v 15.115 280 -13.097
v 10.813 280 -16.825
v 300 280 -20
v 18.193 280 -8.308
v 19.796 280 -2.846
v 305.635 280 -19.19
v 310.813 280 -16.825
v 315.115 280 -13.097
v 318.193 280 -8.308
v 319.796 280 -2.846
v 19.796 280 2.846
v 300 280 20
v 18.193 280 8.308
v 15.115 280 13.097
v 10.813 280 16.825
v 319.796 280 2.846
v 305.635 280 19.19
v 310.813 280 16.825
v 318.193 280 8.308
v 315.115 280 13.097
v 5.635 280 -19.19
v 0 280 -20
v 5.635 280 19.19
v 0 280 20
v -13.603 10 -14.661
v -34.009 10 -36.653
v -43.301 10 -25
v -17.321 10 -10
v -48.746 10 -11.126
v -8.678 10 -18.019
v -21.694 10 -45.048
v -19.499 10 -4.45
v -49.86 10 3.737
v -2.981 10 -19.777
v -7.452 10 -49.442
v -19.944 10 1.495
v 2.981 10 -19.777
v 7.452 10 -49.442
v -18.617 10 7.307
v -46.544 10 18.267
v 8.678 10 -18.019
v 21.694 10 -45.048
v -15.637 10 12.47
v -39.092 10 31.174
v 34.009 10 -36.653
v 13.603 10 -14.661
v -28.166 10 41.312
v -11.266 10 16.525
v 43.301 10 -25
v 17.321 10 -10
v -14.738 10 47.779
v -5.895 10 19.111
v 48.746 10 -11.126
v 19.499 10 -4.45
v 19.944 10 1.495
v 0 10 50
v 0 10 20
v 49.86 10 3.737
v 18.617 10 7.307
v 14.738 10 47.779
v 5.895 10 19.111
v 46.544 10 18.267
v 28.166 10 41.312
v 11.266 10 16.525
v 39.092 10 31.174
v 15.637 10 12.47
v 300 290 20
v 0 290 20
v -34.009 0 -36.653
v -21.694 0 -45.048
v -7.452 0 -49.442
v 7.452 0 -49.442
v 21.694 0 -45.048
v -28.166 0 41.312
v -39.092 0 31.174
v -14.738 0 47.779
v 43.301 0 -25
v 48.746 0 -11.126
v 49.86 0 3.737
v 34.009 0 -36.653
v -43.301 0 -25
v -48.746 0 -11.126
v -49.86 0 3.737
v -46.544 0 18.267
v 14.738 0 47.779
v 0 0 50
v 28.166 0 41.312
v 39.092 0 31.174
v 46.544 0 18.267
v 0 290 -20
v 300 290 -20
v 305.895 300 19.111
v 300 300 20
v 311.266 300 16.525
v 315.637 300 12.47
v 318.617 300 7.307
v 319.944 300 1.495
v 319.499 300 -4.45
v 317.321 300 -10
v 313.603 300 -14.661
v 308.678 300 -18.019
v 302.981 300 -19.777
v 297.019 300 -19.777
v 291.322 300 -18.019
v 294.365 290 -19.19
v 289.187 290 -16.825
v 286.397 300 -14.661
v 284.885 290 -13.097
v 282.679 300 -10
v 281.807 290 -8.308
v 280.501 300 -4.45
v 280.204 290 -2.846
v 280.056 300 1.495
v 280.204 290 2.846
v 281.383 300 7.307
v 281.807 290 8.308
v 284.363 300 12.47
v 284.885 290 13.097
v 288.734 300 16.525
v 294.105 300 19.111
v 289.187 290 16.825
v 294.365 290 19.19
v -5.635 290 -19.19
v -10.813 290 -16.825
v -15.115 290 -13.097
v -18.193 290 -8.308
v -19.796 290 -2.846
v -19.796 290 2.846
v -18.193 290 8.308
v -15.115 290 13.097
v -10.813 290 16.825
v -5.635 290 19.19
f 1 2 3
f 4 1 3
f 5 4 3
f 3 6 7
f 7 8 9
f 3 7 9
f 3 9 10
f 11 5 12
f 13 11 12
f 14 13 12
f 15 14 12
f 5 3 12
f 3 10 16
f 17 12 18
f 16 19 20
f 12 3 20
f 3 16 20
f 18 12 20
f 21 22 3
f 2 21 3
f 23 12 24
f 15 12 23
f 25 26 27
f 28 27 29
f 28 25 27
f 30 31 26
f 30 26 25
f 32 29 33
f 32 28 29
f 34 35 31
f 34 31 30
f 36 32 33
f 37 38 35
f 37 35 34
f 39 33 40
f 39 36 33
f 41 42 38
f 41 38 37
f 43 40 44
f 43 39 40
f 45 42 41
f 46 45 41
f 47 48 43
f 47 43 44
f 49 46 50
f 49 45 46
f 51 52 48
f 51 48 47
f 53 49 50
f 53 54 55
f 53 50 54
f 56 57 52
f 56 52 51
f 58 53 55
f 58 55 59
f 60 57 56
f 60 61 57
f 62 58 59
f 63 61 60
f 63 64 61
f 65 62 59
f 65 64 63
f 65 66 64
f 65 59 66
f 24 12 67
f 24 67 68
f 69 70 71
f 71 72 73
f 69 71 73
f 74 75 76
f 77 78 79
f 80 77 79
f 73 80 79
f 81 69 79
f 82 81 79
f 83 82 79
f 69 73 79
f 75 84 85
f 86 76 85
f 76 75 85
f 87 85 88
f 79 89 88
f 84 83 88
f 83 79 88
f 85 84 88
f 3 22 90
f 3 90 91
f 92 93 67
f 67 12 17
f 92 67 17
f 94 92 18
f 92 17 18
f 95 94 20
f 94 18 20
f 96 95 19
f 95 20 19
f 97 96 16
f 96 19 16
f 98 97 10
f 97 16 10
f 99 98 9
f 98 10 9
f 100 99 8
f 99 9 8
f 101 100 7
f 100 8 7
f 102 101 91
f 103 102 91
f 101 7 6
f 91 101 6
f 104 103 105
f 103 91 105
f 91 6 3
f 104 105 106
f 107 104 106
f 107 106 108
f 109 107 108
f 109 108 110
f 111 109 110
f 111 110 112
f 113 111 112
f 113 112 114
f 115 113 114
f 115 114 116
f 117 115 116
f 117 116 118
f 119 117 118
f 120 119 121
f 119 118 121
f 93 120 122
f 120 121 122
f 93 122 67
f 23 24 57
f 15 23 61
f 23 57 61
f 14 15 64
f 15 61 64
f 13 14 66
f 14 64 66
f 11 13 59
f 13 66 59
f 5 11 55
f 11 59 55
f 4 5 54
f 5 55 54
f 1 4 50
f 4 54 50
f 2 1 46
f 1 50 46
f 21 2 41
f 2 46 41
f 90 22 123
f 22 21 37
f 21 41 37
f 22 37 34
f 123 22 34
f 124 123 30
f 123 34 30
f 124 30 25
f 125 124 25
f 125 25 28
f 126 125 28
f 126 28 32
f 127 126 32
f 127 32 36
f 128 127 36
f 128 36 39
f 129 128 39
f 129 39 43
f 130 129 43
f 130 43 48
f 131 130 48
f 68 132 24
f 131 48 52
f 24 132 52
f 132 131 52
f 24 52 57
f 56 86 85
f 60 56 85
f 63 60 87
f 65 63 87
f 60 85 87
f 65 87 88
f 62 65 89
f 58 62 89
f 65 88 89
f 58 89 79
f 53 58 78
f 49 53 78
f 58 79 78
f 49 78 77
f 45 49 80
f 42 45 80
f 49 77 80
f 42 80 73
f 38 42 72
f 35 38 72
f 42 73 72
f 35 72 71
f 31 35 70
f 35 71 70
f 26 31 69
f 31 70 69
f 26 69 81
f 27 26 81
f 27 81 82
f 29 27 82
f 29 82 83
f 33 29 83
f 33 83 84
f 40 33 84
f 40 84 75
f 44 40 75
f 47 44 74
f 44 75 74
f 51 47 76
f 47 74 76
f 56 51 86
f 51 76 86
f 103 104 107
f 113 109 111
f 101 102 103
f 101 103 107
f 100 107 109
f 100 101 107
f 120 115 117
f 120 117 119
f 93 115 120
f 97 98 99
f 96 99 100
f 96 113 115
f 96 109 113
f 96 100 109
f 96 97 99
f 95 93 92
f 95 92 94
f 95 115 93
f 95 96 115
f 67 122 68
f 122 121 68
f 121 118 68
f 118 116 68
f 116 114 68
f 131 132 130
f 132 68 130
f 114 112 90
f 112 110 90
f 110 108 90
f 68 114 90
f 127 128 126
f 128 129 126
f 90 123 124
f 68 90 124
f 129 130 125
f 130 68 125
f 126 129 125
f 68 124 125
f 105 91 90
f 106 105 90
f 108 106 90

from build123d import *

# Parameters (mm, degrees)
SKETCH1_R                = 50
BOSS_EXTRUDE1_DEPTH      = 10
SKETCH2_R                = 20
BOSS_EXTRUDE2_DEPTH      = 280
BOSS_EXTRUDE3_START      = -10
BOSS_EXTRUDE3_DEPTH      = 10
BOSS_EXTRUDE4_DEPTH      = 10
BOSS_EXTRUDE4_DEPTH_BACK = 10
SKETCH5_R                = 20


with BuildPart() as part:
    # Sketch1 → Boss-Extrude1 (new body)
    with BuildSketch(Plane(origin=(0, 0, 0), x_dir=(1, 0, 0), z_dir=(0, 1, 0))):
        with Locations(Location((0, 0, 0), (0, 0, 270))):
            Circle(SKETCH1_R)
    extrude(amount=BOSS_EXTRUDE1_DEPTH)

    # Sketch2 → Boss-Extrude2 (add)
    with BuildSketch(Plane(origin=(0, 10, 0), x_dir=(1, 0, 0), z_dir=(0, 1, 0))):
        with Locations(Location((0, 0, 0), (0, 0, 270))):
            Circle(SKETCH2_R)
    extrude(amount=BOSS_EXTRUDE2_DEPTH)

    # Sketch4 → Boss-Extrude3 (add)
    with BuildSketch(Plane(origin=(0, 290, 0), x_dir=(1, 0, 0), z_dir=(0, 1, 0)).offset(BOSS_EXTRUDE3_START)):
        with BuildLine():
            Line((0, 20), (300, 20))
            Line((300, 20), (300, -20))
            Line((300, -20), (0, -20))
            ThreePointArc((0, -20), (-20, 0), (0, 20))
        make_face()
    extrude(amount=BOSS_EXTRUDE3_DEPTH)

    # Sketch5 → Boss-Extrude4 (add, two sides: drawn at the far end of the back side and taken through both)
    with BuildSketch(Plane(origin=(0, 290, 0), x_dir=(1, 0, 0), z_dir=(0, 1, 0)).offset(-BOSS_EXTRUDE4_DEPTH_BACK)):
        with Locations(Location((300, 0, 0), (0, 0, 270))):
            Circle(SKETCH5_R)
    extrude(amount=BOSS_EXTRUDE4_DEPTH + BOSS_EXTRUDE4_DEPTH_BACK)


solid = part.part
